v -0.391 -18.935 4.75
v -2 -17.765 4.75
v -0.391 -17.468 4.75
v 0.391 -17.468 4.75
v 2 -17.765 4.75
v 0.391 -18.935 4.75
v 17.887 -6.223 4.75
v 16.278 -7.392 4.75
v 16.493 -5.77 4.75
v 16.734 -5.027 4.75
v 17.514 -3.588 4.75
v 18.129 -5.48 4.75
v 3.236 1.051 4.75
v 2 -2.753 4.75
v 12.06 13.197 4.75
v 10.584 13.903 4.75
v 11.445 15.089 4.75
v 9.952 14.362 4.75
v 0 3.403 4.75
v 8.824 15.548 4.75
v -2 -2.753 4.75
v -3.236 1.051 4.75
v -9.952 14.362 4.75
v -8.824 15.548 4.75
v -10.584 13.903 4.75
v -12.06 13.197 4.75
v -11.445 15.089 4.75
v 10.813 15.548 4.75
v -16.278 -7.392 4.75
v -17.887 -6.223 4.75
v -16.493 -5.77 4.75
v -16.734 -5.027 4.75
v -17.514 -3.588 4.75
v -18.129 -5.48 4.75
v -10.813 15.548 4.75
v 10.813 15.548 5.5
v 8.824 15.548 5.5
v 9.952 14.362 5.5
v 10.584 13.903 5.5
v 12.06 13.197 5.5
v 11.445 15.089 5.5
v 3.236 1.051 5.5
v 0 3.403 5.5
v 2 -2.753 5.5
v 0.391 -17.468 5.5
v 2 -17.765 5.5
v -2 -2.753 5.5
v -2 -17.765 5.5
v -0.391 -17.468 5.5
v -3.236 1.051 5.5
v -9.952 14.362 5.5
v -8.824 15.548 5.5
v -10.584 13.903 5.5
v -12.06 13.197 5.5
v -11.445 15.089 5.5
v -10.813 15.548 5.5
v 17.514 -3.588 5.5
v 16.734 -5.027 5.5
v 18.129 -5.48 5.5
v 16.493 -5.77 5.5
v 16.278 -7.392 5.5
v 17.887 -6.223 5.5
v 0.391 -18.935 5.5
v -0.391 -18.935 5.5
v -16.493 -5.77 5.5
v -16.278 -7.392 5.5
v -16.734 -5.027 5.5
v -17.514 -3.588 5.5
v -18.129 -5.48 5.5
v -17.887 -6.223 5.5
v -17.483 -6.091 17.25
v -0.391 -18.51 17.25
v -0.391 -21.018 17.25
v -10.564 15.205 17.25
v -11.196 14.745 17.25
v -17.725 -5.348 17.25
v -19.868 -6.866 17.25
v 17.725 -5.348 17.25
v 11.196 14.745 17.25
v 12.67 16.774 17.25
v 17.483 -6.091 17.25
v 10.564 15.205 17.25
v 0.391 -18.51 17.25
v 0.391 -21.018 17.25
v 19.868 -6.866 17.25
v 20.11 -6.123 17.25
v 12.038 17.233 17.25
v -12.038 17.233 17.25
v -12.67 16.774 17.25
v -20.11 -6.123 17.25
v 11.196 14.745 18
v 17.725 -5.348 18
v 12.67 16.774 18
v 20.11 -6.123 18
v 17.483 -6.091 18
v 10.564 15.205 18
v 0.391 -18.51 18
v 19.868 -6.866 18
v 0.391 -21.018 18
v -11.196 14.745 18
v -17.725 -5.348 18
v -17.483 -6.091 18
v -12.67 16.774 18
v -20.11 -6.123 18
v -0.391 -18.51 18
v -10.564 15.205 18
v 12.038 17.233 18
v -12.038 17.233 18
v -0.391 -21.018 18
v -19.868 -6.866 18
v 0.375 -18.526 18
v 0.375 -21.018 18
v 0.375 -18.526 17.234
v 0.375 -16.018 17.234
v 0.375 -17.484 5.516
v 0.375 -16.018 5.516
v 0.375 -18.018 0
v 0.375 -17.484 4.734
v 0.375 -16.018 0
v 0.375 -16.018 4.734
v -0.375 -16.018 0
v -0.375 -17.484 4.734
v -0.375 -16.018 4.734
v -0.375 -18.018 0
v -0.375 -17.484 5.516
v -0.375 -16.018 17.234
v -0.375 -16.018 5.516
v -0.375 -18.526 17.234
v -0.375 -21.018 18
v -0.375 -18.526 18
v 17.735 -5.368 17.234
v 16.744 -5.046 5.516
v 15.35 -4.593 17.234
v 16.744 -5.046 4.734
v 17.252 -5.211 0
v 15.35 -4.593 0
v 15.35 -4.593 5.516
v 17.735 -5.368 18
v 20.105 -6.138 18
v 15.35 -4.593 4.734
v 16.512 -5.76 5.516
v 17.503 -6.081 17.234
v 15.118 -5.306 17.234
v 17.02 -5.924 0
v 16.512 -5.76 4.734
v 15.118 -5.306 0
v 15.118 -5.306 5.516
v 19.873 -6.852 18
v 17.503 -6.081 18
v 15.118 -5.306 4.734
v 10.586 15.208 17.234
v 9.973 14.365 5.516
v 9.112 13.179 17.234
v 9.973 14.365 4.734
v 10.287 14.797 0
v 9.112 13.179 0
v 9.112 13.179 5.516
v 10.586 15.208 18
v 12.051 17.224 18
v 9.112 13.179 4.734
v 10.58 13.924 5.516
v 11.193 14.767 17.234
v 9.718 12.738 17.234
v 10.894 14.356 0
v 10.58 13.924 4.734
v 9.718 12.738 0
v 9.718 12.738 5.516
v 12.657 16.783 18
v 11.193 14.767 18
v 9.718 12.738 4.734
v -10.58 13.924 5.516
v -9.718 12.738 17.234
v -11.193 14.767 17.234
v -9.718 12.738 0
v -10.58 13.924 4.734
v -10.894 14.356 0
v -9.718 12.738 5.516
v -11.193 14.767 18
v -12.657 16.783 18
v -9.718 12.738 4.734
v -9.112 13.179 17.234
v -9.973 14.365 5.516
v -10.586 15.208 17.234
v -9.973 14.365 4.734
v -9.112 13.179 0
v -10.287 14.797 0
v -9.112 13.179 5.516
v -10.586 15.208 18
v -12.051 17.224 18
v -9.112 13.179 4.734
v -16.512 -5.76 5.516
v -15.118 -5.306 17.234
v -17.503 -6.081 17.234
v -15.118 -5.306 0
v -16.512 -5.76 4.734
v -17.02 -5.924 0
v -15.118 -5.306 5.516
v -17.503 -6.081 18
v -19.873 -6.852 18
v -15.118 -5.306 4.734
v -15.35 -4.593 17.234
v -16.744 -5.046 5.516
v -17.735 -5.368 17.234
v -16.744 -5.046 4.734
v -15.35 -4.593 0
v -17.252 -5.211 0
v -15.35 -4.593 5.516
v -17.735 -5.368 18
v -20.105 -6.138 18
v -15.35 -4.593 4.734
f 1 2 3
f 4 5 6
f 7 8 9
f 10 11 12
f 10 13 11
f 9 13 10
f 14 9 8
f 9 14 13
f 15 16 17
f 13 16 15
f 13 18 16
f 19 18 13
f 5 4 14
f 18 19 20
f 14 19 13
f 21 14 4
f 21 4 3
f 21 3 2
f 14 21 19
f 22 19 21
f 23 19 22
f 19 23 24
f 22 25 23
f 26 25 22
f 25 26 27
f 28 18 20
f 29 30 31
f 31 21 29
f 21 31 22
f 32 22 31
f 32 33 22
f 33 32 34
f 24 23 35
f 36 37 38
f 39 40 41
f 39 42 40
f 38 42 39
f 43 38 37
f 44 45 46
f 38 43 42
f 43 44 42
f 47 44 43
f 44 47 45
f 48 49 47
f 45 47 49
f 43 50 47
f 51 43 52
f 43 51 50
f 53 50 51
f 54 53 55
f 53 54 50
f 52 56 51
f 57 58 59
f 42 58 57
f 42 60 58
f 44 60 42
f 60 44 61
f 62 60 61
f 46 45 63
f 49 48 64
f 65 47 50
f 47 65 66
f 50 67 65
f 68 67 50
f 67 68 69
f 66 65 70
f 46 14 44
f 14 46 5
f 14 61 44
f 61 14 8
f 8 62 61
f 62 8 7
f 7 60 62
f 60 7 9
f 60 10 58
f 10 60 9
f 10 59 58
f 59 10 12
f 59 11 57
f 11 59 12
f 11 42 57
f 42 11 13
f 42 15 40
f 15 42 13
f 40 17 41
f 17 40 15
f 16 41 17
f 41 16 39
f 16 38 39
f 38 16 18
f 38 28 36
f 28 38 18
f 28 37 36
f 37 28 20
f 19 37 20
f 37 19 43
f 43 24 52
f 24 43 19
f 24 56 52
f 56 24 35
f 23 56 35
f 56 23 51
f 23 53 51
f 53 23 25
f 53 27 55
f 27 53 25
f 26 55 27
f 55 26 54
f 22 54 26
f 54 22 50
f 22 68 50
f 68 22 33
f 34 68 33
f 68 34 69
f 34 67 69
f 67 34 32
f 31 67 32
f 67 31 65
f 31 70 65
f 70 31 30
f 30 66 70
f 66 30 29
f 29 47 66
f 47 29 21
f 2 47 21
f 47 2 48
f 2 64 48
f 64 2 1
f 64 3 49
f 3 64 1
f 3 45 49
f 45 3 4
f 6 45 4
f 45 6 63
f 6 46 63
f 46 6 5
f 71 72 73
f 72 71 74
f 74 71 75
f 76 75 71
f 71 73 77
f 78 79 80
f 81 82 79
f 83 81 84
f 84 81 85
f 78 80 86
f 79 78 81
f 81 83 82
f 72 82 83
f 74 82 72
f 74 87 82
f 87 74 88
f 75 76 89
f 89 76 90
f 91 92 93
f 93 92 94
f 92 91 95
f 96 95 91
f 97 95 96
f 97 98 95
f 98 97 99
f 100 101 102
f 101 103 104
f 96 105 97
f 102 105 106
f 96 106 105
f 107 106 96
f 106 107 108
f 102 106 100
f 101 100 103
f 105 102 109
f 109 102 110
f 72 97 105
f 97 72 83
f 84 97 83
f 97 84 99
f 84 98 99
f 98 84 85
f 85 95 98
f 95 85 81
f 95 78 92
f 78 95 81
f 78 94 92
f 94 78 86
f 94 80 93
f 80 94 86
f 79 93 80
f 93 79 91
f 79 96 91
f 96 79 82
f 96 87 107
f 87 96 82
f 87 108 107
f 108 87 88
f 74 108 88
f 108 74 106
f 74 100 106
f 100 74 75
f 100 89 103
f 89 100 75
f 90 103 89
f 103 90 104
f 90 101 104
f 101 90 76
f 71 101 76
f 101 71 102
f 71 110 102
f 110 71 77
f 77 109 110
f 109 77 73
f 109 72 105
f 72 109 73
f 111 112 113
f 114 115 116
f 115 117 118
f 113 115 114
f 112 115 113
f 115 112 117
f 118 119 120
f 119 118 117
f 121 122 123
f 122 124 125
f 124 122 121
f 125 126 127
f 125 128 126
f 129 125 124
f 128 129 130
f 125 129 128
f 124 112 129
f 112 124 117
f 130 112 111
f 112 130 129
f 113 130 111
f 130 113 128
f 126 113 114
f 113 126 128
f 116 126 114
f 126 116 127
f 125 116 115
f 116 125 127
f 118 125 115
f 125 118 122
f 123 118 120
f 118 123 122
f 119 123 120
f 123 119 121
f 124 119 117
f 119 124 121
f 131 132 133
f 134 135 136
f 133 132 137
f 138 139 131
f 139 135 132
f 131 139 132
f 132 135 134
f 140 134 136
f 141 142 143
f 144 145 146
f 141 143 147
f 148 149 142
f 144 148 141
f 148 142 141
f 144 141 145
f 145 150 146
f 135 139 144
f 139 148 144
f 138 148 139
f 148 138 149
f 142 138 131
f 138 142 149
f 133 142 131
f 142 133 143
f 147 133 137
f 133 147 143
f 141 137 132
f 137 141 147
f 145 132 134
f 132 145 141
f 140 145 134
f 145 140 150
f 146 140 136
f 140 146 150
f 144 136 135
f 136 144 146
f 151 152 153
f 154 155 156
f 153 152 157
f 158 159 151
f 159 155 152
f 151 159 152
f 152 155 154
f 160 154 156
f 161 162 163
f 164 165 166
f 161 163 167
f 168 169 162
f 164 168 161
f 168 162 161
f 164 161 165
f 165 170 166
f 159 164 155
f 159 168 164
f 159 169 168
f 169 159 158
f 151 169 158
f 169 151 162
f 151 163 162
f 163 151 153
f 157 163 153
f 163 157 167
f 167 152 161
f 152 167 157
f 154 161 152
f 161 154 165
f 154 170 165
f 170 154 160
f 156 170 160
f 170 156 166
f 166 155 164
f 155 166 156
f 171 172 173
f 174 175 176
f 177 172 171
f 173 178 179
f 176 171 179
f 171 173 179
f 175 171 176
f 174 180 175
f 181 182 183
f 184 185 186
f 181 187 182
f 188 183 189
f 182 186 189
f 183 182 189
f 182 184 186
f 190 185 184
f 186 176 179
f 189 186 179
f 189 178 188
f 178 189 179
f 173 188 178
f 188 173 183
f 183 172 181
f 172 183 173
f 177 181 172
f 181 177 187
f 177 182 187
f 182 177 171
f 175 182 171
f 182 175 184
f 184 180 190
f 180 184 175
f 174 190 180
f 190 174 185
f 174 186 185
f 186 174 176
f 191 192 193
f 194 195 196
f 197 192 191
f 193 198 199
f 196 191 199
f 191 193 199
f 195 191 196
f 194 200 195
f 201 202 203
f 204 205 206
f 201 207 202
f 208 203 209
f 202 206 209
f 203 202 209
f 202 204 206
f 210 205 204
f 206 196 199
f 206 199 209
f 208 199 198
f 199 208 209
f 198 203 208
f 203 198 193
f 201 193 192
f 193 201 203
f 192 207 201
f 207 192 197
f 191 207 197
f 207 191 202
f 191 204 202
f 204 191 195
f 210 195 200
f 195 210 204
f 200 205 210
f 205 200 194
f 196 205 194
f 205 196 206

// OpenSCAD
// file: functions.scad
module shelf(type, diameter,leg_width) {
    if (type == 0)
    round_shelf(diameter, leg_width);
    if (type == 1)
    square_shelf(diameter, leg_width);
    if (type == 2)
    square_shelf_leg_supports(diameter, leg_width);
}

module round_shelf(diameter,leg_width) {
    difference() {
        circle(d=diameter);
        leg_slots(diameter, leg_width);
    }
}

module square_shelf(diameter,leg_width) {
    difference() {
        hull() {
            leg_slots(diameter, leg_width);
        }
        leg_slots(diameter, leg_width);
    }
}

module square_shelf_leg_supports(diameter,leg_width) {
    intersection() {
        square_shelf(diameter, leg_width);
        for(i=[0:leg_count-1]) {
            rotate(i*360/leg_count)
            translate([-leg_support/2,-diameter/2])
            square([leg_support,diameter/2]);
        }
    }
}


module leg_slots(diameter, leg_width) {
    for(i=[0:leg_count-1]) {
        rotate(i*360/leg_count)
        translate([-leg_thick/2-gap,-diameter/2])
        square([leg_thick+gapp,leg_width]);
    }
}

module shelf_number(i) {
        shelf(shelves[i], tan(leg_angle)*((top_height-leg_height)/(shelf_count-1)*i+leg_height)*2+bottom,(tan(leg_angle)*((top_height-leg_height)/(shelf_count-1)*i+leg_height)+min_leg)/2+gap/2);
}

module assemble_shelves() {
    for(i=[0:shelf_count-1]) {
        translate([0,0,(top_height-leg_height)/(shelf_count-1)*i+leg_height-plywood])
        linear_extrude(height=plywood)
        shelf_number(i);
    }
}

module assemble_legs() {
    for(i=[0:leg_count-1]) {
        rotate(i*360/leg_count)
        translate([-leg_thick/2-plywood/2,0,0])
        for(l=[1:leg_layers]) {
            translate([plywood*l,0,0])
            leg_3d();
        }
    }
}

//shelf(bottom,min_leg);

module leg() {
    difference() {
        square([min_leg+(top-bottom)/2,top_height]);
        translate([min_leg,0])
        rotate(-leg_angle)
        square([min_leg+(top-bottom),top_height*2]);
        for(i=[0:shelf_count-1]) {
            translate([0,(top_height-leg_height)/(shelf_count-1)*i+leg_height-plywood-gap])
            square([(tan(leg_angle)*((top_height-leg_height)/(shelf_count-1)*i+leg_height)+min_leg)/2+gap/2,plywood+gapp]);
        }
            
    }
}

module leg_3d() {
    translate([0,-bottom/2+min_leg,0])
    rotate([90,0,-90])
    translate([0,0,-plywood/2])
    color("lime")
    linear_extrude(height=plywood)
    leg();
}

module assemble() {
    assemble_shelves();
    assemble_legs();
}

module plate() {
    for(i=[0:leg_count/2-1]) {
        translate([i*((top-bottom)/2+min_leg*2+tree*2),0]) {
            leg();
            translate([min_leg+(top-bottom)/2+tree+min_leg,top_height])
            rotate(180)
            leg();
        }
    }
    if(leg_count%2 != 0) {
            translate([floor(leg_count/2)*((top-bottom)/2+min_leg*2+tree*2),0])
            leg();
    }
    translate([0,-top/2-tree])
    for(i=[0:shelf_count-1]) {
        //too much math, I can drag in inkscape
        translate([top*i,0])
        shelf_number(i);
    }
}
// main file
include <functions.scad>;

//square_top=30;
square_top=30+sin($t*360)*15;
shelves = [2, 1];
// 0 = round
// 1 = square
// 2 = leg_supports (square)
shelf_count = len(shelves);
leg_layers=1;
leg_count = 5;
leg_height = 5.5; // bottom shelf
top_height = 18; //top to ground
min_leg = 2; //smallest size a leg can be
plywood = 0.75;
gap = 1/64;
gapp = gap*2;
pad = 0.1;
padd = pad*2;
leg_thick=plywood*leg_layers;

leg_support=4;

tree=2;

top = sqrt(2*pow((square_top/2),2))*2-leg_thick/2-gap; //diameter
bottom = top-6; //diameter
leg_angle = atan((top-bottom)/2/top_height);
echo("top is", top);

$fn=120;


// RENDER png
module assembled() {
    assemble();
}

// RENDER png
// RENDER svg
// RENDER scad
module cutsheet() {
    plate();
}

rotate([0,0,$t*360/leg_count])
assembled();
